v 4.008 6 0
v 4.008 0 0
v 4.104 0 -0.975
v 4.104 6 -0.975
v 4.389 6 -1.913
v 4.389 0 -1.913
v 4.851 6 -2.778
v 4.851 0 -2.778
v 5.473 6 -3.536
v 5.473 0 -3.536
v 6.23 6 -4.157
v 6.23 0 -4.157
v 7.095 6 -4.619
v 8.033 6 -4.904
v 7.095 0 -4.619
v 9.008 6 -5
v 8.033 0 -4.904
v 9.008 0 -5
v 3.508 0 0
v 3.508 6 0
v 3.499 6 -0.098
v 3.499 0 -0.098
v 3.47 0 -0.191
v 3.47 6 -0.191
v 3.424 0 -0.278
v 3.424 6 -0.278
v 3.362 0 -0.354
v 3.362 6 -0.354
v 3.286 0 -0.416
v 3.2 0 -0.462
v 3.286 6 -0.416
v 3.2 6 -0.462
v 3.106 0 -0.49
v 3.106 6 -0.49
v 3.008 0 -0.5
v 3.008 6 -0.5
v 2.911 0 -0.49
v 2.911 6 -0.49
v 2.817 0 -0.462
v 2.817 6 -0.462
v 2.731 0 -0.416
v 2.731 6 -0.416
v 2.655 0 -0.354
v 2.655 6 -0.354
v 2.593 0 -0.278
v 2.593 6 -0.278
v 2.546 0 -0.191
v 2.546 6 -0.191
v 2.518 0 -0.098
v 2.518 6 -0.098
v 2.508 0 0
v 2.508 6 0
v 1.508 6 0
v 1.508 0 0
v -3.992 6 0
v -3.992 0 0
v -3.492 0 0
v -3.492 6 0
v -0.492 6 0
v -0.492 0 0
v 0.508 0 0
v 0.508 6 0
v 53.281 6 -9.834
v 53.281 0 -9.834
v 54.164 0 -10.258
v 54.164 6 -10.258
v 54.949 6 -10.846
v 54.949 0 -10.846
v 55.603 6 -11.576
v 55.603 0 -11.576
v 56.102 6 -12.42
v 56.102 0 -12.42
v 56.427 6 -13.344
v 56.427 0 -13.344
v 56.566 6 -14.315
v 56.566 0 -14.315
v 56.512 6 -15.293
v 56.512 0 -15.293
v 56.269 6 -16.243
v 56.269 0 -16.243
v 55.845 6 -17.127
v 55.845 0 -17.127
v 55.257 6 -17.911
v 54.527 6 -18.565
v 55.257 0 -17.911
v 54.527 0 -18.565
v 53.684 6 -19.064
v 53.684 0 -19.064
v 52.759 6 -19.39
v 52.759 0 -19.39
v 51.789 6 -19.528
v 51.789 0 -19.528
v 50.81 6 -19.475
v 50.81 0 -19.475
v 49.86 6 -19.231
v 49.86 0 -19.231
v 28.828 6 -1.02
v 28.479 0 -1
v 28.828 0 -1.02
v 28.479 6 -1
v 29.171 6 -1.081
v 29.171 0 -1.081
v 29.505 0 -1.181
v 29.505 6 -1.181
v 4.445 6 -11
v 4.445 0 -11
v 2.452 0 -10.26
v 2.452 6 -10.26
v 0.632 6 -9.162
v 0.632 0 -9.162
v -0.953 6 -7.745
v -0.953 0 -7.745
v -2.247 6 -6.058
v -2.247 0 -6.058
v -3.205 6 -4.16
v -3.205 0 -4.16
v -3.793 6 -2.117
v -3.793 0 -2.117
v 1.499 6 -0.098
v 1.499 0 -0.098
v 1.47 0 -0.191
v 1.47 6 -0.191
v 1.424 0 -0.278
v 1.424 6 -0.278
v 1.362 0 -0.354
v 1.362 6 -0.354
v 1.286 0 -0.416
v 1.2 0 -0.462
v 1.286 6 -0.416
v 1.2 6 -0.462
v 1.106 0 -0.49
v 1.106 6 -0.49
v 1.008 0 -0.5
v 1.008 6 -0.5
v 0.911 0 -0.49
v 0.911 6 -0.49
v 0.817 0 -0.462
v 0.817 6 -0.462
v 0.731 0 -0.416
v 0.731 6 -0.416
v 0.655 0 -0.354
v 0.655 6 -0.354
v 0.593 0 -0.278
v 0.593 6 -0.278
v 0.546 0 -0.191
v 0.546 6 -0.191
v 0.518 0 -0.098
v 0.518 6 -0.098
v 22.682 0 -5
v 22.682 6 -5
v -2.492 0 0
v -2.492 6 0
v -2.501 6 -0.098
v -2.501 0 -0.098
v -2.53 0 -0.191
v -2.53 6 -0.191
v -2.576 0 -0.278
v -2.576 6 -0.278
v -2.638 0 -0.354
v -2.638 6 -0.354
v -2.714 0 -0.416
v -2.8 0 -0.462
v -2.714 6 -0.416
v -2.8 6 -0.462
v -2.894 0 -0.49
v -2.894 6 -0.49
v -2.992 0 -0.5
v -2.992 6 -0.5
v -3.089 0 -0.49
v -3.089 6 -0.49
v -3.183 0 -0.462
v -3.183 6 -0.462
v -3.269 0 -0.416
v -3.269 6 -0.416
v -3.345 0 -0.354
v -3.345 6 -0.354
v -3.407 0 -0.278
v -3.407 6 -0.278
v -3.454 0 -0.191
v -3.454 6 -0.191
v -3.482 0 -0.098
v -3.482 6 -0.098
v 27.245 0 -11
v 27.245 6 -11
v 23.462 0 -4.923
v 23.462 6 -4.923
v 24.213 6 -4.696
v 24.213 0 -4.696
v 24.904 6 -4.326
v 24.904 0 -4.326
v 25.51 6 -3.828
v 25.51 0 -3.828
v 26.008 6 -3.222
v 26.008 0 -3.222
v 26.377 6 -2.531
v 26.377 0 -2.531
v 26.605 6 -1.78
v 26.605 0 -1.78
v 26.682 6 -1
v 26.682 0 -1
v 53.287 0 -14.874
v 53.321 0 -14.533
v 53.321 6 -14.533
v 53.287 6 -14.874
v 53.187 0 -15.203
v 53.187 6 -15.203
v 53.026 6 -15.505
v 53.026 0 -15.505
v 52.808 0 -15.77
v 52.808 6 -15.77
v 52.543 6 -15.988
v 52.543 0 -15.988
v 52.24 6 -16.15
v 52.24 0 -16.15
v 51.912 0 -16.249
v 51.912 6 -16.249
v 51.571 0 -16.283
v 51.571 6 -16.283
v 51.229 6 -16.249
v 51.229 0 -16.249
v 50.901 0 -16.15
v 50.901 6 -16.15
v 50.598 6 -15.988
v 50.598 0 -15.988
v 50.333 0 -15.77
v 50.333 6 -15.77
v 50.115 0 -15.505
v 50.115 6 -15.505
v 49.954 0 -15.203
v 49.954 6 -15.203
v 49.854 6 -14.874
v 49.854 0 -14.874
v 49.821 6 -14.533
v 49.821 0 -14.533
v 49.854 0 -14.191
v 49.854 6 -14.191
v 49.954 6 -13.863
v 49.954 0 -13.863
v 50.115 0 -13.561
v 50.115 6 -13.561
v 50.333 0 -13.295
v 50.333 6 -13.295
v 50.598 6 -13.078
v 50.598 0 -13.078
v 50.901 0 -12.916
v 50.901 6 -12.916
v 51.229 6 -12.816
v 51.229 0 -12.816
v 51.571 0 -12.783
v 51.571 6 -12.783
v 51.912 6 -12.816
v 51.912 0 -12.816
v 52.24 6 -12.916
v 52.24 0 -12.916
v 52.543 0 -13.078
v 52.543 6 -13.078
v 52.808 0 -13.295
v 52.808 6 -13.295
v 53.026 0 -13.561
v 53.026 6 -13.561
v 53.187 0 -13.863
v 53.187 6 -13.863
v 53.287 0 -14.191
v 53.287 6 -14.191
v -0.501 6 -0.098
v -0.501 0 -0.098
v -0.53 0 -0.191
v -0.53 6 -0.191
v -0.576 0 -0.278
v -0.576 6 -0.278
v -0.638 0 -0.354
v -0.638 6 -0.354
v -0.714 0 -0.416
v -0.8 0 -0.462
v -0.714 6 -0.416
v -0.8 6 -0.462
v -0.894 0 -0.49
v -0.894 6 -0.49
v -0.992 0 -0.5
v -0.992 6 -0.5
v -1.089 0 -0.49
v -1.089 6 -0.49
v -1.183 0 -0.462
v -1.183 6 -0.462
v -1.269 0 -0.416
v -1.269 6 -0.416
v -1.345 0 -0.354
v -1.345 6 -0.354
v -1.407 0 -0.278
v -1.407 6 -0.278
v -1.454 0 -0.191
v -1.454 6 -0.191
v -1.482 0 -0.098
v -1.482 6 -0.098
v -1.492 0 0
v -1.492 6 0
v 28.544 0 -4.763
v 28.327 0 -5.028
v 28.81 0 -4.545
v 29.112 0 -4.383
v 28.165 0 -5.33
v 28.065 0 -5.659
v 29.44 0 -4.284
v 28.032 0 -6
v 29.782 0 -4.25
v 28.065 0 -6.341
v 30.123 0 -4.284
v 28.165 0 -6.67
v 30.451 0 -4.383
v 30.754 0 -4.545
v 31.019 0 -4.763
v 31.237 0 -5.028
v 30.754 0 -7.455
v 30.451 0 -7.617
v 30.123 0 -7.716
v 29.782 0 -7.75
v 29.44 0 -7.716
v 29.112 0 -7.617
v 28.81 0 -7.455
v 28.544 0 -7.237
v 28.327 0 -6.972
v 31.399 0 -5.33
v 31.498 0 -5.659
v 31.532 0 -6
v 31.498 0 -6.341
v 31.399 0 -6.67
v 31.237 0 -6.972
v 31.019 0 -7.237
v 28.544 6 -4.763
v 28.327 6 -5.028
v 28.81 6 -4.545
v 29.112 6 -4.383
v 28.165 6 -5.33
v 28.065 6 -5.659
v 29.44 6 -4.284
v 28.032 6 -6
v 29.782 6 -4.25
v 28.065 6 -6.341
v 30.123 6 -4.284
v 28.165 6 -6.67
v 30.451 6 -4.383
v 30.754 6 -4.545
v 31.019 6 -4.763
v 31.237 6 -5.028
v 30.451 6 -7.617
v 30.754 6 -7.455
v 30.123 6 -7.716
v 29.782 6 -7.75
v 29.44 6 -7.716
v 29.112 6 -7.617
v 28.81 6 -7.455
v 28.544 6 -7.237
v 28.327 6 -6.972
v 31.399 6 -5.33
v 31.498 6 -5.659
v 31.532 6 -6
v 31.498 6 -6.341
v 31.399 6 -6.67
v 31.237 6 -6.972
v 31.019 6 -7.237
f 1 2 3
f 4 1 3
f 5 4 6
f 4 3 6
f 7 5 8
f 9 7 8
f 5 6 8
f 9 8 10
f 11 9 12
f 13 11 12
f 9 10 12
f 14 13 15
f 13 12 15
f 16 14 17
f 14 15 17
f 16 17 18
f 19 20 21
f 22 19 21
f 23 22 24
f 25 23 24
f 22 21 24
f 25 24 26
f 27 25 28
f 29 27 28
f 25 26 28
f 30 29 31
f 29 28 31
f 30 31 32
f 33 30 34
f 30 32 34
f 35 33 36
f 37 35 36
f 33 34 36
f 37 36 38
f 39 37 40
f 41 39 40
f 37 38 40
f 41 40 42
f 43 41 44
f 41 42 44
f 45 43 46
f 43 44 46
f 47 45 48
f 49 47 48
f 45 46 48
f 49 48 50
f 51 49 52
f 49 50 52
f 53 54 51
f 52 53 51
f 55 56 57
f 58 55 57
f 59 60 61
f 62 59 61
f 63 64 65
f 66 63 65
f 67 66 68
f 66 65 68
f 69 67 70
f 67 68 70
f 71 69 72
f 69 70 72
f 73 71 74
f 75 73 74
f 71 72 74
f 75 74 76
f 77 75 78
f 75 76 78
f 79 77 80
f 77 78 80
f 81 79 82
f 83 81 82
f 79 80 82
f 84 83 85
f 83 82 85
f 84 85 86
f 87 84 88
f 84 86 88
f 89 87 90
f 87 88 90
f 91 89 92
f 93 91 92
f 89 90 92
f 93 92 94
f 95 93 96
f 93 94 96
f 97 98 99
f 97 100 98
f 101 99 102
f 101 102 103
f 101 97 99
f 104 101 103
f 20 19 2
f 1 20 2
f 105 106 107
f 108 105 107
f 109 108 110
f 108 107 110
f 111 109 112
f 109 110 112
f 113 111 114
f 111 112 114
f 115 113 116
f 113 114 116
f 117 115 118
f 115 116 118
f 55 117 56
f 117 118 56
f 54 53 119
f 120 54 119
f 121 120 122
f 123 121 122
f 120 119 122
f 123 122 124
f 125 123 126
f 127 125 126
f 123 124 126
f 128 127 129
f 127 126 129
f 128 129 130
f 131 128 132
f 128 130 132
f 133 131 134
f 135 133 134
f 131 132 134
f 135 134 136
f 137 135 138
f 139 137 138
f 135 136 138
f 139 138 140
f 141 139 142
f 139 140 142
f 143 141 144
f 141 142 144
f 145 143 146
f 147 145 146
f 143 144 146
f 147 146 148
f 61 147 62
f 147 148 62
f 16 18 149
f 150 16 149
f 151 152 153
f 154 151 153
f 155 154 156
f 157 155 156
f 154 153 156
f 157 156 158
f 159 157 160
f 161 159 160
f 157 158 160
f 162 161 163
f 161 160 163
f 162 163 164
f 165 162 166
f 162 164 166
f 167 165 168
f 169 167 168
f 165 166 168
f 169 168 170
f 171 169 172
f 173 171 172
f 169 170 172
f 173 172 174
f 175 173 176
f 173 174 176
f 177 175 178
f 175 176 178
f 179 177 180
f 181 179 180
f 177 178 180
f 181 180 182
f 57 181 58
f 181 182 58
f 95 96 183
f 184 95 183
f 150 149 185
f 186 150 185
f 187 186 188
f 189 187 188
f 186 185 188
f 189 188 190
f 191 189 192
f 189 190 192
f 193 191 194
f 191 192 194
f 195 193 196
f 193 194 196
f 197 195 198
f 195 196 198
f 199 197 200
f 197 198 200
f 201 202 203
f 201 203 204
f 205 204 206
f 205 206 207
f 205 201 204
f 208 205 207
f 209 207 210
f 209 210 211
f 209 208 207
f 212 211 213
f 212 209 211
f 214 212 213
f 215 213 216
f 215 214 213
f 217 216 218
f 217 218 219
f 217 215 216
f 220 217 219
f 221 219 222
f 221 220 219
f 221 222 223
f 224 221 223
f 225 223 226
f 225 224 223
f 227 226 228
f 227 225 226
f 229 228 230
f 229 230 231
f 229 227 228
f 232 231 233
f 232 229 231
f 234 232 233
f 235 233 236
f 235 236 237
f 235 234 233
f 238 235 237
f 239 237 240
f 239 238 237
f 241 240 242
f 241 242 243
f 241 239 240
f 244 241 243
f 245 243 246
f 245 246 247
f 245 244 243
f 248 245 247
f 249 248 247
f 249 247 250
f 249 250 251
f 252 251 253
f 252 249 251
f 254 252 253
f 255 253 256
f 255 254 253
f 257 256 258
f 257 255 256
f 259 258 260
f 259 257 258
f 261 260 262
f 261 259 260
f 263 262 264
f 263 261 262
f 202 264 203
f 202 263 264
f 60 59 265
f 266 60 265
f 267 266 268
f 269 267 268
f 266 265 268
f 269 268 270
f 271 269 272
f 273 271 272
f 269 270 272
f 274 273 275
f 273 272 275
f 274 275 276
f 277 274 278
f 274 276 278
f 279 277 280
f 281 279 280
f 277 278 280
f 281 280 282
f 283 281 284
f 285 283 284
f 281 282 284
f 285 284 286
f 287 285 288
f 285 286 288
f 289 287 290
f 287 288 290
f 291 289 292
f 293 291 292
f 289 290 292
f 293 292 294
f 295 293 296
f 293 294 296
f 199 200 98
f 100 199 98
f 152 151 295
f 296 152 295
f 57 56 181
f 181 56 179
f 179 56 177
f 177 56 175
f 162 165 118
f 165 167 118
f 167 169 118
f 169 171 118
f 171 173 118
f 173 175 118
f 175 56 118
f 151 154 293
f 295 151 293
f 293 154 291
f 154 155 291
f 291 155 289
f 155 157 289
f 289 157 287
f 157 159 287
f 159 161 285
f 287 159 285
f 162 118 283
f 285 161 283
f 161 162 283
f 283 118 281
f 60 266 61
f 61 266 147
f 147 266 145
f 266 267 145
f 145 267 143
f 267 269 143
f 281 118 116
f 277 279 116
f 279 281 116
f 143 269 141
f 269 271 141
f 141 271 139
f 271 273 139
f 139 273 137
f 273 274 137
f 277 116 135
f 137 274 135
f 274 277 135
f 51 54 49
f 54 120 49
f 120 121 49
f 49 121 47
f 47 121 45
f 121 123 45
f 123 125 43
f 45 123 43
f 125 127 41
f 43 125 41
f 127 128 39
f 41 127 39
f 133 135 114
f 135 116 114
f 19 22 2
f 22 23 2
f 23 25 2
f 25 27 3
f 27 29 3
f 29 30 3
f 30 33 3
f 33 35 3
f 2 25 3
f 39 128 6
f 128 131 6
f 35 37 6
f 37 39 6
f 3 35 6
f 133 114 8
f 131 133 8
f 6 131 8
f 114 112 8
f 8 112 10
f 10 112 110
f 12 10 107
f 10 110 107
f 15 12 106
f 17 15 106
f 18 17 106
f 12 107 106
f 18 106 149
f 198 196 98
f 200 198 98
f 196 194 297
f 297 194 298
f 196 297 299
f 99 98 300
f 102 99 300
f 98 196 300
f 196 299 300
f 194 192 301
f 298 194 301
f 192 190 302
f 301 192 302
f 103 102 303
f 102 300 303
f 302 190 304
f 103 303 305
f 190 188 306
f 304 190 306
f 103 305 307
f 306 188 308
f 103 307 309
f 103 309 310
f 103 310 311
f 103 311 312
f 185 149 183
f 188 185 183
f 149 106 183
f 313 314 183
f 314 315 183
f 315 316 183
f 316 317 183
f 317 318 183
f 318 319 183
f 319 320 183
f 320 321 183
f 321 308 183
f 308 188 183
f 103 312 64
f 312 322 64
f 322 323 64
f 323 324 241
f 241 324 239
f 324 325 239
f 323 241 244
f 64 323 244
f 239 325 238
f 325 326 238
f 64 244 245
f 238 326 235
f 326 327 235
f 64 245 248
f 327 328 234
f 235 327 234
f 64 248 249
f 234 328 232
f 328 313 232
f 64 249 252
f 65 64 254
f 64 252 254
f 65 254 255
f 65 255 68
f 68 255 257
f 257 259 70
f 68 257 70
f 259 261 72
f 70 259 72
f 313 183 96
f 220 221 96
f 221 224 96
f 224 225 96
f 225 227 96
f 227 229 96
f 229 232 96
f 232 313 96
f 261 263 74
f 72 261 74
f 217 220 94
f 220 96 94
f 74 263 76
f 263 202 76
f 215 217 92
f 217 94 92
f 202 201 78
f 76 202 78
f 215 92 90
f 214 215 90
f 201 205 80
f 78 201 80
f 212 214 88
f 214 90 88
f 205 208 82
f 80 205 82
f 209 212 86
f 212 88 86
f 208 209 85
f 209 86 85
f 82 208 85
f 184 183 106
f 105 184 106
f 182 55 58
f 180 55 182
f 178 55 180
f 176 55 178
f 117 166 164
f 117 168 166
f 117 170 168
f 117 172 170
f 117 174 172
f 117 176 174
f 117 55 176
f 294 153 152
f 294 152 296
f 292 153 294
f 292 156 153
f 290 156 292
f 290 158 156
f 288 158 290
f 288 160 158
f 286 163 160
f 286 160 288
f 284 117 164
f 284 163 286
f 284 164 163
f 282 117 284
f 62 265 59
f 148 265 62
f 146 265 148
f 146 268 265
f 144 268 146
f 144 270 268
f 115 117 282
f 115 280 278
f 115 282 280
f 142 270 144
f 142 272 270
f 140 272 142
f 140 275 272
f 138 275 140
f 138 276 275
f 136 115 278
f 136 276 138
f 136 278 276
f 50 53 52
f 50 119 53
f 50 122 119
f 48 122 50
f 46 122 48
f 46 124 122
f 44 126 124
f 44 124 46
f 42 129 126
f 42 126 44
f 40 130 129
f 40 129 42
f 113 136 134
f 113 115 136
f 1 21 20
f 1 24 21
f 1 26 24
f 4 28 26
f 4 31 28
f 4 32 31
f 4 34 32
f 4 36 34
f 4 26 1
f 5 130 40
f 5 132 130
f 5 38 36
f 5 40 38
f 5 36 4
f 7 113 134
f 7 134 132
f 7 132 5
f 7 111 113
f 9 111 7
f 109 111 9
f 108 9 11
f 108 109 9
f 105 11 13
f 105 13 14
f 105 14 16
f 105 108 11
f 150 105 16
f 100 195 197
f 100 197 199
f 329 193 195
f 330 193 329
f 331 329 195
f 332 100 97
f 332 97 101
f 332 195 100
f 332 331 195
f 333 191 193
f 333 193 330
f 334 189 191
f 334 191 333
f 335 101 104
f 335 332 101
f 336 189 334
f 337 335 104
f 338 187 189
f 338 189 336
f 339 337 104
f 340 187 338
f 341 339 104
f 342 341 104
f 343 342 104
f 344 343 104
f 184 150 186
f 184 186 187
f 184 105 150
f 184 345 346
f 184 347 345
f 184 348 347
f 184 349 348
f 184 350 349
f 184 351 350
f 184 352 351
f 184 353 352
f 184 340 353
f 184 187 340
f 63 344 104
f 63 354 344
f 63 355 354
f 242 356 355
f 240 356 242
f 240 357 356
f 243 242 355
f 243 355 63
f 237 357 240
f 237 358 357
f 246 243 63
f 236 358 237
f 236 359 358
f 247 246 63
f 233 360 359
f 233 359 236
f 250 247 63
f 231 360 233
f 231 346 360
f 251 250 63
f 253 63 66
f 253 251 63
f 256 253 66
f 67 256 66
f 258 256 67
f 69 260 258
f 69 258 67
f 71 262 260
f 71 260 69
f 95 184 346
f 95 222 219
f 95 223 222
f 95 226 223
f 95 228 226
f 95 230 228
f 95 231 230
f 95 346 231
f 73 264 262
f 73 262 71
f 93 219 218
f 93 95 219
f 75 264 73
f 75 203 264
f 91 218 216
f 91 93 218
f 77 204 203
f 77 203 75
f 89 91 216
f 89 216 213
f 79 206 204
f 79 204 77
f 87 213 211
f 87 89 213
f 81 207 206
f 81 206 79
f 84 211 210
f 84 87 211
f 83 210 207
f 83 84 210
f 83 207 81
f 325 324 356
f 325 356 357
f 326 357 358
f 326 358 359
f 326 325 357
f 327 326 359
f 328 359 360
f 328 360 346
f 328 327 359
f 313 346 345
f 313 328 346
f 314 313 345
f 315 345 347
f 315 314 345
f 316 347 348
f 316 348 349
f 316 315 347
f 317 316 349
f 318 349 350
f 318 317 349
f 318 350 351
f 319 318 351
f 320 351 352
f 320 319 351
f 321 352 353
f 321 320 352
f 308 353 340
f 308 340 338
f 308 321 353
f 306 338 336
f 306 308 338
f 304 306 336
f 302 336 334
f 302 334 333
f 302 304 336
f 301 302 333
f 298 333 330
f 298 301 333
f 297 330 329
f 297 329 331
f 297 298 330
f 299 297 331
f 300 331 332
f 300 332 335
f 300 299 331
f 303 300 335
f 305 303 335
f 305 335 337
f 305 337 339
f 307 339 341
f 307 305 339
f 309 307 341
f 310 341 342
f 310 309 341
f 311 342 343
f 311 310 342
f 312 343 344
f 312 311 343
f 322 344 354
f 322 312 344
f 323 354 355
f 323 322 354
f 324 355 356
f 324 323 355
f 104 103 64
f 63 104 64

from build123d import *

# Parameters (mm, degrees)
SKETCH_1_R          = 1.75
EXTRUDE_1_DEPTH     = 6
FILLET_1_R          = 3
SKETCH_2_R          = 0.5
CUT_EXTRUDE_1_DEPTH = 7


with BuildPart() as part:
    # Эскиз1 → Бобышка-Вытянуть1 (new body)
    with BuildSketch(Plane(origin=(0, 0, 0), x_dir=(1, 0, 0), z_dir=(0, 1, 0))):
        with BuildLine():
            Line((-3.991673782, 0), (4.008326218, 0))
            ThreePointArc((4.008326218, 0), (5.472792312, 3.535533906), (9.008326218, 5))
            Line((9.008326218, 5), (22.681786604, 5))
            ThreePointArc((22.681786604, 5), (25.510213728, 3.828427125), (26.681786604, 1))
            Line((26.681786604, 1), (29.008326218, 1))
            Line((29.008326218, 1), (53.280650212, 9.83440345))
            ThreePointArc((53.280650212, 9.83440345), (56.269012599, 16.242967271), (49.860448779, 19.231329658))
            Line((49.860448779, 19.231329658), (27.245056411, 11))
            Line((27.245056411, 11), (4.445056411, 11))
            ThreePointArc((4.445056411, 11), (-1.63962848, 6.931421506), (-3.991673782, 0))
        make_face()
        with Locations((51.570549496, 14.532866554)):
            Circle(SKETCH_1_R, mode=Mode.SUBTRACT)
        with Locations((29.781786604, 6)):
            Circle(SKETCH_1_R, mode=Mode.SUBTRACT)
    extrude(amount=EXTRUDE_1_DEPTH)

    # Скругление1
    fillet_1_edges = [part.edges().sort_by_distance(p)[0] for p in [
        (29.008326218, 3, -1),
    ]]
    fillet(fillet_1_edges, radius=FILLET_1_R)

    # Эскиз2 → Вырез-Вытянуть1 (cut, through all)
    with BuildSketch(Plane(origin=(0, 6, 0), x_dir=(1, 0, 0), z_dir=(0, 1, 0))):
        with Locations((1.008326218, 0)):
            Circle(SKETCH_2_R)
        with Locations((3.008326218, 0)):
            Circle(SKETCH_2_R)
        with Locations((-0.991673782, 0)):
            Circle(SKETCH_2_R)
        with Locations((-2.991673782, 0)):
            Circle(SKETCH_2_R)
    extrude(amount=-CUT_EXTRUDE_1_DEPTH, mode=Mode.SUBTRACT)


solid = part.part
